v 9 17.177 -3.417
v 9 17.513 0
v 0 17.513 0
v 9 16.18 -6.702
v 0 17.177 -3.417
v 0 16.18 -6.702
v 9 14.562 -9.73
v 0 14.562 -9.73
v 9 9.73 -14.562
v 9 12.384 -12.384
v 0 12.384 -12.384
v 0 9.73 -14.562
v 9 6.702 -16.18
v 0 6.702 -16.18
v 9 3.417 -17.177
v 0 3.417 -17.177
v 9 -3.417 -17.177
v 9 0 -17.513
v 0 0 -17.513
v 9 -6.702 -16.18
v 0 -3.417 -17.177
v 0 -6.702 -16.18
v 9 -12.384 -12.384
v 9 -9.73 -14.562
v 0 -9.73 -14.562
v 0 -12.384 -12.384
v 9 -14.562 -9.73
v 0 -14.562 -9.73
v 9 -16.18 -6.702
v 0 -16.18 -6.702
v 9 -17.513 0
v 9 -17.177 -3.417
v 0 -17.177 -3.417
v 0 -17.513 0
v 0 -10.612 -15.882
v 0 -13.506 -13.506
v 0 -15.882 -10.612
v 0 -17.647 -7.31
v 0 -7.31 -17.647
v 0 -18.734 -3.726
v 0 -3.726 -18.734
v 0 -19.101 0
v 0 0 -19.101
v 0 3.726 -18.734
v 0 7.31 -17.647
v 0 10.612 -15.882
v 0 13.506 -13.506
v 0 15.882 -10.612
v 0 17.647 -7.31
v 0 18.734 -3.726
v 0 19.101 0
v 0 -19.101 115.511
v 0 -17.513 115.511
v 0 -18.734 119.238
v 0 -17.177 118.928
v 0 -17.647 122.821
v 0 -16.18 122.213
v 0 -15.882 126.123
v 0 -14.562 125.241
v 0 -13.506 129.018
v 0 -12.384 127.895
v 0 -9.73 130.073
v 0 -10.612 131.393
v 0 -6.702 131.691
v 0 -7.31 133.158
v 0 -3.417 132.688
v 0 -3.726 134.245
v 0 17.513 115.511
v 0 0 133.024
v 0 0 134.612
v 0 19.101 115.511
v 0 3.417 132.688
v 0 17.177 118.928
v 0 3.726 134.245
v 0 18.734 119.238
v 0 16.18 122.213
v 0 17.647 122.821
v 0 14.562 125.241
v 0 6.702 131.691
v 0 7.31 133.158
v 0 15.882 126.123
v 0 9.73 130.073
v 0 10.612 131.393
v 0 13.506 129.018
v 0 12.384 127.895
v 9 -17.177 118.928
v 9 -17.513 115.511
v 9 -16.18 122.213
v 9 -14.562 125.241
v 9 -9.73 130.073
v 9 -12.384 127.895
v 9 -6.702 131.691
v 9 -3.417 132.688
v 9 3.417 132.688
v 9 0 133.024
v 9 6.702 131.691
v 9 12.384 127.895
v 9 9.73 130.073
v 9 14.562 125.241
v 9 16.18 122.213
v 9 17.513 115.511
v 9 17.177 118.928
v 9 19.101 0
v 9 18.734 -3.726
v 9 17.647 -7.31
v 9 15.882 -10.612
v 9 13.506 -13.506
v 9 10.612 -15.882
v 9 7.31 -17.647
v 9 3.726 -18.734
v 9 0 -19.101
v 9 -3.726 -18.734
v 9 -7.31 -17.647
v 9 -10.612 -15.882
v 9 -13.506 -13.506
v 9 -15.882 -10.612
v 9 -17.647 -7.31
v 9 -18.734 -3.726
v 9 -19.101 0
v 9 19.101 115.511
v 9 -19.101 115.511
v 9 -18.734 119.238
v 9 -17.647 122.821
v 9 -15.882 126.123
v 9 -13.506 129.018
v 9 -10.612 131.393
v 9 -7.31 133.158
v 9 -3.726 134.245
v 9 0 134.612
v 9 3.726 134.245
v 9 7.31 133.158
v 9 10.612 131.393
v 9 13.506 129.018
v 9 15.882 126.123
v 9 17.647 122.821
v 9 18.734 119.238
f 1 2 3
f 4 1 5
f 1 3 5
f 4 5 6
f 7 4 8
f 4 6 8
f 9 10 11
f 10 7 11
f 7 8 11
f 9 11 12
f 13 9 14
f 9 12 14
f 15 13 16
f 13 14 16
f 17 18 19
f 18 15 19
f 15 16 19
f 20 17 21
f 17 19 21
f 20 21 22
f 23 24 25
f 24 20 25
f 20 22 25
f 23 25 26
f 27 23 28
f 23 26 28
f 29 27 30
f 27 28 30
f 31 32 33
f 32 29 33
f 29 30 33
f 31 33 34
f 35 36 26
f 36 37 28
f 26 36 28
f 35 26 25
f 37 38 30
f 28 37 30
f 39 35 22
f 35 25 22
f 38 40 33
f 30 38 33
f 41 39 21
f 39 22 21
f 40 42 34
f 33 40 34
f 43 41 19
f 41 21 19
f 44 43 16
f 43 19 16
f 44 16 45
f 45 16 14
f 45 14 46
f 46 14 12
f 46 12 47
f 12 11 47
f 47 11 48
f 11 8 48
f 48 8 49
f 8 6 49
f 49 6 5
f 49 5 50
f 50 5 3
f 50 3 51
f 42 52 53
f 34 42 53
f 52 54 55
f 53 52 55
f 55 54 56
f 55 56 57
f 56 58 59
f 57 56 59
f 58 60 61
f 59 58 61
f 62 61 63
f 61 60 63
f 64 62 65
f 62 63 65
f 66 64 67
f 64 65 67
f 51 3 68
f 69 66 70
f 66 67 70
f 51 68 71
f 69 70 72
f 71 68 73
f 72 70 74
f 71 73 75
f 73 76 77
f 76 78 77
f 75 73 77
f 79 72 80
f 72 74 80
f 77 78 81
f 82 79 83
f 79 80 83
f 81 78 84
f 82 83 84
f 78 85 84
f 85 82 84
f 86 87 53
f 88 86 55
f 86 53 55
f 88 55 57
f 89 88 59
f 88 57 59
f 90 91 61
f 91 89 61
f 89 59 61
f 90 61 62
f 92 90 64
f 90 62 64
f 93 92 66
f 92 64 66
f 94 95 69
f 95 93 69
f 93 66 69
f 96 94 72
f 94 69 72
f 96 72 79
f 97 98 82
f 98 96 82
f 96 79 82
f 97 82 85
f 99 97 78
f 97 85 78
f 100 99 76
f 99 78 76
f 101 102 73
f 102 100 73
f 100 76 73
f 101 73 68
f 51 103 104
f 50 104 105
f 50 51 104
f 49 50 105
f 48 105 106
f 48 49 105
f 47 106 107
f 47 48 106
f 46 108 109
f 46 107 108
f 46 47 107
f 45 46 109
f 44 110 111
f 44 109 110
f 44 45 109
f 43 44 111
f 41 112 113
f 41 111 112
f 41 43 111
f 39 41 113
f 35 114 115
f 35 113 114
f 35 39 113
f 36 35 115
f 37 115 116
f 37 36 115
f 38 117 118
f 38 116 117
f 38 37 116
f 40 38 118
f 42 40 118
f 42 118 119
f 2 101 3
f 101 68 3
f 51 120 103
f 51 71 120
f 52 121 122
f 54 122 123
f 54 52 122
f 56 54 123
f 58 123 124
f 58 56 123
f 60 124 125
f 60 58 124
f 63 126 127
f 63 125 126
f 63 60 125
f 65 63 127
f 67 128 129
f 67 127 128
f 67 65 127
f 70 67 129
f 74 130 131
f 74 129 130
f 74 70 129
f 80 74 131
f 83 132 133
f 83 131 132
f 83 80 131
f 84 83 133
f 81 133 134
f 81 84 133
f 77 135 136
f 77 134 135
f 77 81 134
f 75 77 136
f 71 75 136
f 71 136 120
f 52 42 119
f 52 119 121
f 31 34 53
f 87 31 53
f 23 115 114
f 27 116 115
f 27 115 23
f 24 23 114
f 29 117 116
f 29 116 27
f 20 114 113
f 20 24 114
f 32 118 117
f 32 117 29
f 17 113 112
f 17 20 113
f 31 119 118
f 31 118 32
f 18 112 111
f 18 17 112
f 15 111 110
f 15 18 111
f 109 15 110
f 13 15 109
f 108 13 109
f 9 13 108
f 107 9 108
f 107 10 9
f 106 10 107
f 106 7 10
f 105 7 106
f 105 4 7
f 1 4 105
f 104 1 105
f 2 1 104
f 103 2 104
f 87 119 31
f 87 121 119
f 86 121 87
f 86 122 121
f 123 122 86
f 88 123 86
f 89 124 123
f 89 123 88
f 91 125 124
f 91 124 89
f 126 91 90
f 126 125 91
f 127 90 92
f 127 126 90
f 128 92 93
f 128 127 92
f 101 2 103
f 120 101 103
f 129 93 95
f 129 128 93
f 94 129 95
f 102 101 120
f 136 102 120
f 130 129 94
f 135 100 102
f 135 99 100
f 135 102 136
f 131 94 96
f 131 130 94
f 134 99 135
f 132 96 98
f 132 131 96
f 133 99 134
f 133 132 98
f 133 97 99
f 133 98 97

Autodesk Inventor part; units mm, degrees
ref_plane "YZ Plane" through (0, 0, 0) normal (1, 0, 0) x (0, 1, 0)
ref_plane "XZ Plane" through (0, 0, 0) normal (0, 1, 0) x (-1, 0, 0)
ref_plane "XY Plane" through (0, 0, 0) normal (0, 0, 1) x (1, 0, 0)
sketch "Sketch1" plane through (0, 0, 0) normal (1, 0, 0) x (0, 1, 0)
  arc A0 (-19.1008, 0) -> (19.1008, 0) centre (0, 0) ccw
  arc A1 (19.1008, 115.5112) -> (-19.1008, 115.5112) centre (0, 115.5112) ccw
  line L0 (19.1008, 115.5112) -> (19.1008, 0)
  line L1 (-19.1008, 0) -> (-19.1008, 115.5112)
  arc A2 (-17.5133, 0) -> (17.5133, 0) centre (0, 0) ccw
  line L2 (-17.5133, 0) -> (-17.5133, 115.5112)
  arc A3 (17.5133, 115.5112) -> (-17.5133, 115.5112) centre (0, 115.5112) ccw
  line L3 (17.5133, 115.5112) -> (17.5133, 0)
  dimension "d0" = 19.1008
  dimension "d1" = 115.5112
  dimension "d5" = 1.5875
extrude "Extrusion1" add sketch "Sketch1" along normal blind 9
properties part number "STANDIN,BELT,70T,HTD5mm" material "Nylon 6/6"
